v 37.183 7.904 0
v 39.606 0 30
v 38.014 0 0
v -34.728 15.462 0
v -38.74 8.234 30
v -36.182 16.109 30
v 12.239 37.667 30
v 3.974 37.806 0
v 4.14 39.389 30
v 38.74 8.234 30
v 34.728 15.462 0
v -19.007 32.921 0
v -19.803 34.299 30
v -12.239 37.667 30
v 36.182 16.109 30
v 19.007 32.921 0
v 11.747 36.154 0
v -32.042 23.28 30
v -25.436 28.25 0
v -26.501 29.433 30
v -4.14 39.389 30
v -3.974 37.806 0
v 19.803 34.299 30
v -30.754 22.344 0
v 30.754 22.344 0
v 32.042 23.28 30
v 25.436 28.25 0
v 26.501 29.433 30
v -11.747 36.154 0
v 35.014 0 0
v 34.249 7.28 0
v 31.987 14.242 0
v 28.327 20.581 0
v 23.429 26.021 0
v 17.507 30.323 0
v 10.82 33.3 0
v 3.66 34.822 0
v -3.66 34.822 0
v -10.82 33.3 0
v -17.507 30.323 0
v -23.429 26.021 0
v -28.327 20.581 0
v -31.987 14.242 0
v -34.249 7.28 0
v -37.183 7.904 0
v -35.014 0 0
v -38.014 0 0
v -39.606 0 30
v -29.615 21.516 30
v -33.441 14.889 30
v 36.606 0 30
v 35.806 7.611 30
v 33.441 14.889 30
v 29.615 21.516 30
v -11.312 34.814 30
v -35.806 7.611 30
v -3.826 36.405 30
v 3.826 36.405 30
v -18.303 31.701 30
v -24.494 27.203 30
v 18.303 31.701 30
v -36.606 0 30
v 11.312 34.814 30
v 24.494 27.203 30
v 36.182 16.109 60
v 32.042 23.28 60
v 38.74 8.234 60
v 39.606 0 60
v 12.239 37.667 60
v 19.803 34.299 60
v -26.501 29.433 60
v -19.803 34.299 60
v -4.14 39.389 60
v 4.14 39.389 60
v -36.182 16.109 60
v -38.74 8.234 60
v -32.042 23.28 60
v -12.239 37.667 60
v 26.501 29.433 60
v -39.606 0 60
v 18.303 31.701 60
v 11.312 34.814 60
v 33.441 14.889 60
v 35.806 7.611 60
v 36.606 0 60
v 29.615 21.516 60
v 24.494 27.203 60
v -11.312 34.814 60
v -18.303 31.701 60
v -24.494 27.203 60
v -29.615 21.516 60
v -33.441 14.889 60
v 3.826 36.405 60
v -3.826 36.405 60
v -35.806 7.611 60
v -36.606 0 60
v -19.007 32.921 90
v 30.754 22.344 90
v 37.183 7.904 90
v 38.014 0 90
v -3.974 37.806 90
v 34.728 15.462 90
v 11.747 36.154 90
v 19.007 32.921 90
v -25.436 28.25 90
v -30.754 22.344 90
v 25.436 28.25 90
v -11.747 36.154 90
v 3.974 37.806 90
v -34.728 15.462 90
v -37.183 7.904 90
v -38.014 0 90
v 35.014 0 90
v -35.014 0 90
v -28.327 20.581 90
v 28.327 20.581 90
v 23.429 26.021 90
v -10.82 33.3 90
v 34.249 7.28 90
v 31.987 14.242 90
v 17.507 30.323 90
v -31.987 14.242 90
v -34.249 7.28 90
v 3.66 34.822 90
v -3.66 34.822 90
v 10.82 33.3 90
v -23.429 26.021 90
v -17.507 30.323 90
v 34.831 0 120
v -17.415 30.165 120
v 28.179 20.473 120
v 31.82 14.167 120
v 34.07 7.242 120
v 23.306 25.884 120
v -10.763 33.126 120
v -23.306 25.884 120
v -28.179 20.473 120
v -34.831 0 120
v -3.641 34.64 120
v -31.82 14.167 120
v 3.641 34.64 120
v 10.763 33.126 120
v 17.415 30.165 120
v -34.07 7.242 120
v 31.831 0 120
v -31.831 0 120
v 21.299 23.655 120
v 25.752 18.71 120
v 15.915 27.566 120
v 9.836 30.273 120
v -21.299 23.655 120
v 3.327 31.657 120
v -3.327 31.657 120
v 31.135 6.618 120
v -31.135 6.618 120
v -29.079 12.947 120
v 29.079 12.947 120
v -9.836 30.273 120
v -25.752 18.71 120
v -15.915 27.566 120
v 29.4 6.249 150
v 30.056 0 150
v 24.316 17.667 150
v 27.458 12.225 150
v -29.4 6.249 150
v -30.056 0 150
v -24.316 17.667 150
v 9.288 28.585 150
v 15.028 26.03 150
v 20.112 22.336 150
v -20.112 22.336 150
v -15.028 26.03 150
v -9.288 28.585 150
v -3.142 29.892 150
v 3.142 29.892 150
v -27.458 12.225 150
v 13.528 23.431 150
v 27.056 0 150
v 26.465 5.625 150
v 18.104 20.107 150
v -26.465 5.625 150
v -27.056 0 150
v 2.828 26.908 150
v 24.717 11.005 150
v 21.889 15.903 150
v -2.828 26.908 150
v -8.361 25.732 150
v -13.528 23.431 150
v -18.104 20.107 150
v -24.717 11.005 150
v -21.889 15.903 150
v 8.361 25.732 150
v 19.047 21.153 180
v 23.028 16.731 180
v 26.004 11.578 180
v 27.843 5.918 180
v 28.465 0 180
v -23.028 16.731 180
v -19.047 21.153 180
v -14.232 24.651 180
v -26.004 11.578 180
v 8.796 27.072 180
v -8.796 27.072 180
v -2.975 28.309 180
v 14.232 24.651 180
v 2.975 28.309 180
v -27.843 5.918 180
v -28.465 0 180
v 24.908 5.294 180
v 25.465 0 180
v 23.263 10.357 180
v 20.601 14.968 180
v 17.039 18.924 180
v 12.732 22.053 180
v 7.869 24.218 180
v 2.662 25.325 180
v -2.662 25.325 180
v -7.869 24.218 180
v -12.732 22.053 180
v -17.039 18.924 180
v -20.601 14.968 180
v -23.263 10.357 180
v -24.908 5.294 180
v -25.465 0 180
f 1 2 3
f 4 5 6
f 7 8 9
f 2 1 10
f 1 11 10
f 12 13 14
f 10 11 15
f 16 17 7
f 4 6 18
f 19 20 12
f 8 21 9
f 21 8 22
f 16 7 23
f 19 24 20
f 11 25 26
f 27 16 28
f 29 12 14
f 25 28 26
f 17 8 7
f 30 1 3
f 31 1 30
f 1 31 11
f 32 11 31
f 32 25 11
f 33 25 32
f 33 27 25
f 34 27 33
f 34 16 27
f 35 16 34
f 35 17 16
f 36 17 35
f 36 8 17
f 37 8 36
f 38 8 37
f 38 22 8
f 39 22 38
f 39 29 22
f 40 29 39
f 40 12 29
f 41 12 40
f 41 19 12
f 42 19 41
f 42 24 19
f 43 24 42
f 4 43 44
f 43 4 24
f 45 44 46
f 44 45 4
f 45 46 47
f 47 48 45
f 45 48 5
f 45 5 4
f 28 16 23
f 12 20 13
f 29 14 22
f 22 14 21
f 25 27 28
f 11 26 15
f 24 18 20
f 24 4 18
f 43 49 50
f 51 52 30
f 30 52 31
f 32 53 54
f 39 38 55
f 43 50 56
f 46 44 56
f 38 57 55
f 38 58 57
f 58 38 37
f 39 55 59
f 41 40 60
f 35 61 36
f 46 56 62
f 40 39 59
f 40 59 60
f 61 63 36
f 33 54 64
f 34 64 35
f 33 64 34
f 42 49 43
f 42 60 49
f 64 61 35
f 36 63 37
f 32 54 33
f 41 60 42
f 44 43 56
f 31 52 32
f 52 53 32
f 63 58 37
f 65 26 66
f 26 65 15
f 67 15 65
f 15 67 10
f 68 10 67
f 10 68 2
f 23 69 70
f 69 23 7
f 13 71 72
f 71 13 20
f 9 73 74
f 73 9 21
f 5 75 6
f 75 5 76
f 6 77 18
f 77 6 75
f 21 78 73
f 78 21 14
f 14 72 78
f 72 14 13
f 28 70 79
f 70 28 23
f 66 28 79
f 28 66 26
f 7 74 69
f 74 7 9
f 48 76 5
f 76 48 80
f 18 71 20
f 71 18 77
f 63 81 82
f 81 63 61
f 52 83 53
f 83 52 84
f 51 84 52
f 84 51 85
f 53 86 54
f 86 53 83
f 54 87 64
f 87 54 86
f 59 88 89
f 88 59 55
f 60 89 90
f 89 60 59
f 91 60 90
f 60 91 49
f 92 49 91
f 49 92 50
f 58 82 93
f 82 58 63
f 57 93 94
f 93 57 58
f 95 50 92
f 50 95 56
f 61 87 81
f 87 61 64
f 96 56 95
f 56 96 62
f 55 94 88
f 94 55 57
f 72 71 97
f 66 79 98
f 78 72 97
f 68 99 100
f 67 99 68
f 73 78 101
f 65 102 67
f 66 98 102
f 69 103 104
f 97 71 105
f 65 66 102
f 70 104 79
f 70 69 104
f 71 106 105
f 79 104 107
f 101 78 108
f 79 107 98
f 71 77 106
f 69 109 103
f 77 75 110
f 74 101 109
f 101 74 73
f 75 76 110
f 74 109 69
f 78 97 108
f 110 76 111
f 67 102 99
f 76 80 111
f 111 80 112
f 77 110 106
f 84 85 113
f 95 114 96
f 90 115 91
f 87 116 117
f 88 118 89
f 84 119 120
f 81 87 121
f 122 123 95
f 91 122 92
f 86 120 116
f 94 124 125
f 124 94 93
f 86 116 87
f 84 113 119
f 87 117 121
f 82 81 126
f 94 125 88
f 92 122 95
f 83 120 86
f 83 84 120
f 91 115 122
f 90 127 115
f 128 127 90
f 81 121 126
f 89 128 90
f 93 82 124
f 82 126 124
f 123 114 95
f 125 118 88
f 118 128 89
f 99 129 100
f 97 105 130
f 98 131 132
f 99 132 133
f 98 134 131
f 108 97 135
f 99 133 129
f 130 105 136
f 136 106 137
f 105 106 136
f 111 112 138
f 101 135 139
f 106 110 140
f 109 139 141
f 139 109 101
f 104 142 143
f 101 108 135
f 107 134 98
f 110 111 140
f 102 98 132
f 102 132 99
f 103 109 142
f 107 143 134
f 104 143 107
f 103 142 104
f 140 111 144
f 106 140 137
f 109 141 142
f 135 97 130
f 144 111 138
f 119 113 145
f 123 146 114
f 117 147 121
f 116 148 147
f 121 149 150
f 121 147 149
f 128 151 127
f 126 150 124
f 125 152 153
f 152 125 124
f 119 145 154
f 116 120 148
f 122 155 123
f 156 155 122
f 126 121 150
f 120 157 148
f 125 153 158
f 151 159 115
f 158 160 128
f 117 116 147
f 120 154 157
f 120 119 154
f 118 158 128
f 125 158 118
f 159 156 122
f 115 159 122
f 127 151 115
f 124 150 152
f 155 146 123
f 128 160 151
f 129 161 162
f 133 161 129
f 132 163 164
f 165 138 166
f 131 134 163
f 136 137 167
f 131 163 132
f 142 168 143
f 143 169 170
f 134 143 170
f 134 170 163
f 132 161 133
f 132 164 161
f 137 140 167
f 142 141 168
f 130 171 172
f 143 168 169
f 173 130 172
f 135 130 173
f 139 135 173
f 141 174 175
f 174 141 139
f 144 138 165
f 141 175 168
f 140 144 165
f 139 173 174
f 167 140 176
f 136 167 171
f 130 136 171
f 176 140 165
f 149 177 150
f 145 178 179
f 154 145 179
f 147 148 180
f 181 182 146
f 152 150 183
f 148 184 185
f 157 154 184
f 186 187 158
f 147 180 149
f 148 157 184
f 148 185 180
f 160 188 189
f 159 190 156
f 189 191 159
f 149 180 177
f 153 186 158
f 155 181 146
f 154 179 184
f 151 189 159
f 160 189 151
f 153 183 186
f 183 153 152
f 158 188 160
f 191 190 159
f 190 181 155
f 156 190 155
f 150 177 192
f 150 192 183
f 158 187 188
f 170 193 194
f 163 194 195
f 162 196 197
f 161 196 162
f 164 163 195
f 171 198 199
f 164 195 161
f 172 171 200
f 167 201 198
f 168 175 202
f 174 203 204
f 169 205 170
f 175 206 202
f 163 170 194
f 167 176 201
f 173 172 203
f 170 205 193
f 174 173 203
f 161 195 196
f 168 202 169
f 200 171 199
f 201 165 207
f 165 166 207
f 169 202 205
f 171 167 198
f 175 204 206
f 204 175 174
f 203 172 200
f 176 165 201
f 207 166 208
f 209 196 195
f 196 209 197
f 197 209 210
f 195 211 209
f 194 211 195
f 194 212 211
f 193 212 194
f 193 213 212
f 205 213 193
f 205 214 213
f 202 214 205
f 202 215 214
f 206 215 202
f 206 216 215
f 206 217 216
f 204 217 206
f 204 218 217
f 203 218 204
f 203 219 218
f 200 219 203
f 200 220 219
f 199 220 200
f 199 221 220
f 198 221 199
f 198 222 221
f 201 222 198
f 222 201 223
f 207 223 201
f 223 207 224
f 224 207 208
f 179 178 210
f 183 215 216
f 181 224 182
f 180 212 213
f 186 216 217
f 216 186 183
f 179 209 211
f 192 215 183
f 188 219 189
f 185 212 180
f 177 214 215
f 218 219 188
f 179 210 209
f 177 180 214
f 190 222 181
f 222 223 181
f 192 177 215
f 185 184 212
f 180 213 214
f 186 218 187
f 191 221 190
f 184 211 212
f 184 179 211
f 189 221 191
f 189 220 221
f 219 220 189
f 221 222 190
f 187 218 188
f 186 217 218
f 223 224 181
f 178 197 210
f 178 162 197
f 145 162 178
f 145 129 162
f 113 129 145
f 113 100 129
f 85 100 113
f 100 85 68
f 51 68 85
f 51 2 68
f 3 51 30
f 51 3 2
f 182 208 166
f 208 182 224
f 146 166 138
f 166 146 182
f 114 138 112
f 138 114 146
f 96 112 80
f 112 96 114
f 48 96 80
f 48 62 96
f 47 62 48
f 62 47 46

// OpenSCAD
difference()  {
union()  {
translate([0.0,0.0,0.0])  difference()  {
cylinder(r1=38.014088,r2=39.605637,h=30.0);
cylinder(r1=35.014088,r2=36.605637,h=30.0);
}
translate([0.0,0.0,30.0])  difference()  {
cylinder(r1=39.605637,r2=39.605637,h=30.0);
cylinder(r1=36.605637,r2=36.605637,h=30.0);
}
translate([0.0,0.0,60.0])  difference()  {
cylinder(r1=39.605637,r2=38.014088,h=30.0);
cylinder(r1=36.605637,r2=35.014088,h=30.0);
}
translate([0.0,0.0,90.0])  difference()  {
cylinder(r1=38.014088,r2=34.83099,h=30.0);
cylinder(r1=35.014088,r2=31.830988,h=30.0);
}
translate([0.0,0.0,120.0])  difference()  {
cylinder(r1=34.83099,r2=30.056341,h=30.0);
cylinder(r1=31.830988,r2=27.056341,h=30.0);
}
translate([0.0,0.0,150.0])  difference()  {
cylinder(r1=30.056341,r2=28.46479,h=30.0);
cylinder(r1=27.056341,r2=25.46479,h=30.0);
}
}
translate([-39.605637,-39.605637,0.0])  cube([79.21127,39.605637,210.0]);
}
